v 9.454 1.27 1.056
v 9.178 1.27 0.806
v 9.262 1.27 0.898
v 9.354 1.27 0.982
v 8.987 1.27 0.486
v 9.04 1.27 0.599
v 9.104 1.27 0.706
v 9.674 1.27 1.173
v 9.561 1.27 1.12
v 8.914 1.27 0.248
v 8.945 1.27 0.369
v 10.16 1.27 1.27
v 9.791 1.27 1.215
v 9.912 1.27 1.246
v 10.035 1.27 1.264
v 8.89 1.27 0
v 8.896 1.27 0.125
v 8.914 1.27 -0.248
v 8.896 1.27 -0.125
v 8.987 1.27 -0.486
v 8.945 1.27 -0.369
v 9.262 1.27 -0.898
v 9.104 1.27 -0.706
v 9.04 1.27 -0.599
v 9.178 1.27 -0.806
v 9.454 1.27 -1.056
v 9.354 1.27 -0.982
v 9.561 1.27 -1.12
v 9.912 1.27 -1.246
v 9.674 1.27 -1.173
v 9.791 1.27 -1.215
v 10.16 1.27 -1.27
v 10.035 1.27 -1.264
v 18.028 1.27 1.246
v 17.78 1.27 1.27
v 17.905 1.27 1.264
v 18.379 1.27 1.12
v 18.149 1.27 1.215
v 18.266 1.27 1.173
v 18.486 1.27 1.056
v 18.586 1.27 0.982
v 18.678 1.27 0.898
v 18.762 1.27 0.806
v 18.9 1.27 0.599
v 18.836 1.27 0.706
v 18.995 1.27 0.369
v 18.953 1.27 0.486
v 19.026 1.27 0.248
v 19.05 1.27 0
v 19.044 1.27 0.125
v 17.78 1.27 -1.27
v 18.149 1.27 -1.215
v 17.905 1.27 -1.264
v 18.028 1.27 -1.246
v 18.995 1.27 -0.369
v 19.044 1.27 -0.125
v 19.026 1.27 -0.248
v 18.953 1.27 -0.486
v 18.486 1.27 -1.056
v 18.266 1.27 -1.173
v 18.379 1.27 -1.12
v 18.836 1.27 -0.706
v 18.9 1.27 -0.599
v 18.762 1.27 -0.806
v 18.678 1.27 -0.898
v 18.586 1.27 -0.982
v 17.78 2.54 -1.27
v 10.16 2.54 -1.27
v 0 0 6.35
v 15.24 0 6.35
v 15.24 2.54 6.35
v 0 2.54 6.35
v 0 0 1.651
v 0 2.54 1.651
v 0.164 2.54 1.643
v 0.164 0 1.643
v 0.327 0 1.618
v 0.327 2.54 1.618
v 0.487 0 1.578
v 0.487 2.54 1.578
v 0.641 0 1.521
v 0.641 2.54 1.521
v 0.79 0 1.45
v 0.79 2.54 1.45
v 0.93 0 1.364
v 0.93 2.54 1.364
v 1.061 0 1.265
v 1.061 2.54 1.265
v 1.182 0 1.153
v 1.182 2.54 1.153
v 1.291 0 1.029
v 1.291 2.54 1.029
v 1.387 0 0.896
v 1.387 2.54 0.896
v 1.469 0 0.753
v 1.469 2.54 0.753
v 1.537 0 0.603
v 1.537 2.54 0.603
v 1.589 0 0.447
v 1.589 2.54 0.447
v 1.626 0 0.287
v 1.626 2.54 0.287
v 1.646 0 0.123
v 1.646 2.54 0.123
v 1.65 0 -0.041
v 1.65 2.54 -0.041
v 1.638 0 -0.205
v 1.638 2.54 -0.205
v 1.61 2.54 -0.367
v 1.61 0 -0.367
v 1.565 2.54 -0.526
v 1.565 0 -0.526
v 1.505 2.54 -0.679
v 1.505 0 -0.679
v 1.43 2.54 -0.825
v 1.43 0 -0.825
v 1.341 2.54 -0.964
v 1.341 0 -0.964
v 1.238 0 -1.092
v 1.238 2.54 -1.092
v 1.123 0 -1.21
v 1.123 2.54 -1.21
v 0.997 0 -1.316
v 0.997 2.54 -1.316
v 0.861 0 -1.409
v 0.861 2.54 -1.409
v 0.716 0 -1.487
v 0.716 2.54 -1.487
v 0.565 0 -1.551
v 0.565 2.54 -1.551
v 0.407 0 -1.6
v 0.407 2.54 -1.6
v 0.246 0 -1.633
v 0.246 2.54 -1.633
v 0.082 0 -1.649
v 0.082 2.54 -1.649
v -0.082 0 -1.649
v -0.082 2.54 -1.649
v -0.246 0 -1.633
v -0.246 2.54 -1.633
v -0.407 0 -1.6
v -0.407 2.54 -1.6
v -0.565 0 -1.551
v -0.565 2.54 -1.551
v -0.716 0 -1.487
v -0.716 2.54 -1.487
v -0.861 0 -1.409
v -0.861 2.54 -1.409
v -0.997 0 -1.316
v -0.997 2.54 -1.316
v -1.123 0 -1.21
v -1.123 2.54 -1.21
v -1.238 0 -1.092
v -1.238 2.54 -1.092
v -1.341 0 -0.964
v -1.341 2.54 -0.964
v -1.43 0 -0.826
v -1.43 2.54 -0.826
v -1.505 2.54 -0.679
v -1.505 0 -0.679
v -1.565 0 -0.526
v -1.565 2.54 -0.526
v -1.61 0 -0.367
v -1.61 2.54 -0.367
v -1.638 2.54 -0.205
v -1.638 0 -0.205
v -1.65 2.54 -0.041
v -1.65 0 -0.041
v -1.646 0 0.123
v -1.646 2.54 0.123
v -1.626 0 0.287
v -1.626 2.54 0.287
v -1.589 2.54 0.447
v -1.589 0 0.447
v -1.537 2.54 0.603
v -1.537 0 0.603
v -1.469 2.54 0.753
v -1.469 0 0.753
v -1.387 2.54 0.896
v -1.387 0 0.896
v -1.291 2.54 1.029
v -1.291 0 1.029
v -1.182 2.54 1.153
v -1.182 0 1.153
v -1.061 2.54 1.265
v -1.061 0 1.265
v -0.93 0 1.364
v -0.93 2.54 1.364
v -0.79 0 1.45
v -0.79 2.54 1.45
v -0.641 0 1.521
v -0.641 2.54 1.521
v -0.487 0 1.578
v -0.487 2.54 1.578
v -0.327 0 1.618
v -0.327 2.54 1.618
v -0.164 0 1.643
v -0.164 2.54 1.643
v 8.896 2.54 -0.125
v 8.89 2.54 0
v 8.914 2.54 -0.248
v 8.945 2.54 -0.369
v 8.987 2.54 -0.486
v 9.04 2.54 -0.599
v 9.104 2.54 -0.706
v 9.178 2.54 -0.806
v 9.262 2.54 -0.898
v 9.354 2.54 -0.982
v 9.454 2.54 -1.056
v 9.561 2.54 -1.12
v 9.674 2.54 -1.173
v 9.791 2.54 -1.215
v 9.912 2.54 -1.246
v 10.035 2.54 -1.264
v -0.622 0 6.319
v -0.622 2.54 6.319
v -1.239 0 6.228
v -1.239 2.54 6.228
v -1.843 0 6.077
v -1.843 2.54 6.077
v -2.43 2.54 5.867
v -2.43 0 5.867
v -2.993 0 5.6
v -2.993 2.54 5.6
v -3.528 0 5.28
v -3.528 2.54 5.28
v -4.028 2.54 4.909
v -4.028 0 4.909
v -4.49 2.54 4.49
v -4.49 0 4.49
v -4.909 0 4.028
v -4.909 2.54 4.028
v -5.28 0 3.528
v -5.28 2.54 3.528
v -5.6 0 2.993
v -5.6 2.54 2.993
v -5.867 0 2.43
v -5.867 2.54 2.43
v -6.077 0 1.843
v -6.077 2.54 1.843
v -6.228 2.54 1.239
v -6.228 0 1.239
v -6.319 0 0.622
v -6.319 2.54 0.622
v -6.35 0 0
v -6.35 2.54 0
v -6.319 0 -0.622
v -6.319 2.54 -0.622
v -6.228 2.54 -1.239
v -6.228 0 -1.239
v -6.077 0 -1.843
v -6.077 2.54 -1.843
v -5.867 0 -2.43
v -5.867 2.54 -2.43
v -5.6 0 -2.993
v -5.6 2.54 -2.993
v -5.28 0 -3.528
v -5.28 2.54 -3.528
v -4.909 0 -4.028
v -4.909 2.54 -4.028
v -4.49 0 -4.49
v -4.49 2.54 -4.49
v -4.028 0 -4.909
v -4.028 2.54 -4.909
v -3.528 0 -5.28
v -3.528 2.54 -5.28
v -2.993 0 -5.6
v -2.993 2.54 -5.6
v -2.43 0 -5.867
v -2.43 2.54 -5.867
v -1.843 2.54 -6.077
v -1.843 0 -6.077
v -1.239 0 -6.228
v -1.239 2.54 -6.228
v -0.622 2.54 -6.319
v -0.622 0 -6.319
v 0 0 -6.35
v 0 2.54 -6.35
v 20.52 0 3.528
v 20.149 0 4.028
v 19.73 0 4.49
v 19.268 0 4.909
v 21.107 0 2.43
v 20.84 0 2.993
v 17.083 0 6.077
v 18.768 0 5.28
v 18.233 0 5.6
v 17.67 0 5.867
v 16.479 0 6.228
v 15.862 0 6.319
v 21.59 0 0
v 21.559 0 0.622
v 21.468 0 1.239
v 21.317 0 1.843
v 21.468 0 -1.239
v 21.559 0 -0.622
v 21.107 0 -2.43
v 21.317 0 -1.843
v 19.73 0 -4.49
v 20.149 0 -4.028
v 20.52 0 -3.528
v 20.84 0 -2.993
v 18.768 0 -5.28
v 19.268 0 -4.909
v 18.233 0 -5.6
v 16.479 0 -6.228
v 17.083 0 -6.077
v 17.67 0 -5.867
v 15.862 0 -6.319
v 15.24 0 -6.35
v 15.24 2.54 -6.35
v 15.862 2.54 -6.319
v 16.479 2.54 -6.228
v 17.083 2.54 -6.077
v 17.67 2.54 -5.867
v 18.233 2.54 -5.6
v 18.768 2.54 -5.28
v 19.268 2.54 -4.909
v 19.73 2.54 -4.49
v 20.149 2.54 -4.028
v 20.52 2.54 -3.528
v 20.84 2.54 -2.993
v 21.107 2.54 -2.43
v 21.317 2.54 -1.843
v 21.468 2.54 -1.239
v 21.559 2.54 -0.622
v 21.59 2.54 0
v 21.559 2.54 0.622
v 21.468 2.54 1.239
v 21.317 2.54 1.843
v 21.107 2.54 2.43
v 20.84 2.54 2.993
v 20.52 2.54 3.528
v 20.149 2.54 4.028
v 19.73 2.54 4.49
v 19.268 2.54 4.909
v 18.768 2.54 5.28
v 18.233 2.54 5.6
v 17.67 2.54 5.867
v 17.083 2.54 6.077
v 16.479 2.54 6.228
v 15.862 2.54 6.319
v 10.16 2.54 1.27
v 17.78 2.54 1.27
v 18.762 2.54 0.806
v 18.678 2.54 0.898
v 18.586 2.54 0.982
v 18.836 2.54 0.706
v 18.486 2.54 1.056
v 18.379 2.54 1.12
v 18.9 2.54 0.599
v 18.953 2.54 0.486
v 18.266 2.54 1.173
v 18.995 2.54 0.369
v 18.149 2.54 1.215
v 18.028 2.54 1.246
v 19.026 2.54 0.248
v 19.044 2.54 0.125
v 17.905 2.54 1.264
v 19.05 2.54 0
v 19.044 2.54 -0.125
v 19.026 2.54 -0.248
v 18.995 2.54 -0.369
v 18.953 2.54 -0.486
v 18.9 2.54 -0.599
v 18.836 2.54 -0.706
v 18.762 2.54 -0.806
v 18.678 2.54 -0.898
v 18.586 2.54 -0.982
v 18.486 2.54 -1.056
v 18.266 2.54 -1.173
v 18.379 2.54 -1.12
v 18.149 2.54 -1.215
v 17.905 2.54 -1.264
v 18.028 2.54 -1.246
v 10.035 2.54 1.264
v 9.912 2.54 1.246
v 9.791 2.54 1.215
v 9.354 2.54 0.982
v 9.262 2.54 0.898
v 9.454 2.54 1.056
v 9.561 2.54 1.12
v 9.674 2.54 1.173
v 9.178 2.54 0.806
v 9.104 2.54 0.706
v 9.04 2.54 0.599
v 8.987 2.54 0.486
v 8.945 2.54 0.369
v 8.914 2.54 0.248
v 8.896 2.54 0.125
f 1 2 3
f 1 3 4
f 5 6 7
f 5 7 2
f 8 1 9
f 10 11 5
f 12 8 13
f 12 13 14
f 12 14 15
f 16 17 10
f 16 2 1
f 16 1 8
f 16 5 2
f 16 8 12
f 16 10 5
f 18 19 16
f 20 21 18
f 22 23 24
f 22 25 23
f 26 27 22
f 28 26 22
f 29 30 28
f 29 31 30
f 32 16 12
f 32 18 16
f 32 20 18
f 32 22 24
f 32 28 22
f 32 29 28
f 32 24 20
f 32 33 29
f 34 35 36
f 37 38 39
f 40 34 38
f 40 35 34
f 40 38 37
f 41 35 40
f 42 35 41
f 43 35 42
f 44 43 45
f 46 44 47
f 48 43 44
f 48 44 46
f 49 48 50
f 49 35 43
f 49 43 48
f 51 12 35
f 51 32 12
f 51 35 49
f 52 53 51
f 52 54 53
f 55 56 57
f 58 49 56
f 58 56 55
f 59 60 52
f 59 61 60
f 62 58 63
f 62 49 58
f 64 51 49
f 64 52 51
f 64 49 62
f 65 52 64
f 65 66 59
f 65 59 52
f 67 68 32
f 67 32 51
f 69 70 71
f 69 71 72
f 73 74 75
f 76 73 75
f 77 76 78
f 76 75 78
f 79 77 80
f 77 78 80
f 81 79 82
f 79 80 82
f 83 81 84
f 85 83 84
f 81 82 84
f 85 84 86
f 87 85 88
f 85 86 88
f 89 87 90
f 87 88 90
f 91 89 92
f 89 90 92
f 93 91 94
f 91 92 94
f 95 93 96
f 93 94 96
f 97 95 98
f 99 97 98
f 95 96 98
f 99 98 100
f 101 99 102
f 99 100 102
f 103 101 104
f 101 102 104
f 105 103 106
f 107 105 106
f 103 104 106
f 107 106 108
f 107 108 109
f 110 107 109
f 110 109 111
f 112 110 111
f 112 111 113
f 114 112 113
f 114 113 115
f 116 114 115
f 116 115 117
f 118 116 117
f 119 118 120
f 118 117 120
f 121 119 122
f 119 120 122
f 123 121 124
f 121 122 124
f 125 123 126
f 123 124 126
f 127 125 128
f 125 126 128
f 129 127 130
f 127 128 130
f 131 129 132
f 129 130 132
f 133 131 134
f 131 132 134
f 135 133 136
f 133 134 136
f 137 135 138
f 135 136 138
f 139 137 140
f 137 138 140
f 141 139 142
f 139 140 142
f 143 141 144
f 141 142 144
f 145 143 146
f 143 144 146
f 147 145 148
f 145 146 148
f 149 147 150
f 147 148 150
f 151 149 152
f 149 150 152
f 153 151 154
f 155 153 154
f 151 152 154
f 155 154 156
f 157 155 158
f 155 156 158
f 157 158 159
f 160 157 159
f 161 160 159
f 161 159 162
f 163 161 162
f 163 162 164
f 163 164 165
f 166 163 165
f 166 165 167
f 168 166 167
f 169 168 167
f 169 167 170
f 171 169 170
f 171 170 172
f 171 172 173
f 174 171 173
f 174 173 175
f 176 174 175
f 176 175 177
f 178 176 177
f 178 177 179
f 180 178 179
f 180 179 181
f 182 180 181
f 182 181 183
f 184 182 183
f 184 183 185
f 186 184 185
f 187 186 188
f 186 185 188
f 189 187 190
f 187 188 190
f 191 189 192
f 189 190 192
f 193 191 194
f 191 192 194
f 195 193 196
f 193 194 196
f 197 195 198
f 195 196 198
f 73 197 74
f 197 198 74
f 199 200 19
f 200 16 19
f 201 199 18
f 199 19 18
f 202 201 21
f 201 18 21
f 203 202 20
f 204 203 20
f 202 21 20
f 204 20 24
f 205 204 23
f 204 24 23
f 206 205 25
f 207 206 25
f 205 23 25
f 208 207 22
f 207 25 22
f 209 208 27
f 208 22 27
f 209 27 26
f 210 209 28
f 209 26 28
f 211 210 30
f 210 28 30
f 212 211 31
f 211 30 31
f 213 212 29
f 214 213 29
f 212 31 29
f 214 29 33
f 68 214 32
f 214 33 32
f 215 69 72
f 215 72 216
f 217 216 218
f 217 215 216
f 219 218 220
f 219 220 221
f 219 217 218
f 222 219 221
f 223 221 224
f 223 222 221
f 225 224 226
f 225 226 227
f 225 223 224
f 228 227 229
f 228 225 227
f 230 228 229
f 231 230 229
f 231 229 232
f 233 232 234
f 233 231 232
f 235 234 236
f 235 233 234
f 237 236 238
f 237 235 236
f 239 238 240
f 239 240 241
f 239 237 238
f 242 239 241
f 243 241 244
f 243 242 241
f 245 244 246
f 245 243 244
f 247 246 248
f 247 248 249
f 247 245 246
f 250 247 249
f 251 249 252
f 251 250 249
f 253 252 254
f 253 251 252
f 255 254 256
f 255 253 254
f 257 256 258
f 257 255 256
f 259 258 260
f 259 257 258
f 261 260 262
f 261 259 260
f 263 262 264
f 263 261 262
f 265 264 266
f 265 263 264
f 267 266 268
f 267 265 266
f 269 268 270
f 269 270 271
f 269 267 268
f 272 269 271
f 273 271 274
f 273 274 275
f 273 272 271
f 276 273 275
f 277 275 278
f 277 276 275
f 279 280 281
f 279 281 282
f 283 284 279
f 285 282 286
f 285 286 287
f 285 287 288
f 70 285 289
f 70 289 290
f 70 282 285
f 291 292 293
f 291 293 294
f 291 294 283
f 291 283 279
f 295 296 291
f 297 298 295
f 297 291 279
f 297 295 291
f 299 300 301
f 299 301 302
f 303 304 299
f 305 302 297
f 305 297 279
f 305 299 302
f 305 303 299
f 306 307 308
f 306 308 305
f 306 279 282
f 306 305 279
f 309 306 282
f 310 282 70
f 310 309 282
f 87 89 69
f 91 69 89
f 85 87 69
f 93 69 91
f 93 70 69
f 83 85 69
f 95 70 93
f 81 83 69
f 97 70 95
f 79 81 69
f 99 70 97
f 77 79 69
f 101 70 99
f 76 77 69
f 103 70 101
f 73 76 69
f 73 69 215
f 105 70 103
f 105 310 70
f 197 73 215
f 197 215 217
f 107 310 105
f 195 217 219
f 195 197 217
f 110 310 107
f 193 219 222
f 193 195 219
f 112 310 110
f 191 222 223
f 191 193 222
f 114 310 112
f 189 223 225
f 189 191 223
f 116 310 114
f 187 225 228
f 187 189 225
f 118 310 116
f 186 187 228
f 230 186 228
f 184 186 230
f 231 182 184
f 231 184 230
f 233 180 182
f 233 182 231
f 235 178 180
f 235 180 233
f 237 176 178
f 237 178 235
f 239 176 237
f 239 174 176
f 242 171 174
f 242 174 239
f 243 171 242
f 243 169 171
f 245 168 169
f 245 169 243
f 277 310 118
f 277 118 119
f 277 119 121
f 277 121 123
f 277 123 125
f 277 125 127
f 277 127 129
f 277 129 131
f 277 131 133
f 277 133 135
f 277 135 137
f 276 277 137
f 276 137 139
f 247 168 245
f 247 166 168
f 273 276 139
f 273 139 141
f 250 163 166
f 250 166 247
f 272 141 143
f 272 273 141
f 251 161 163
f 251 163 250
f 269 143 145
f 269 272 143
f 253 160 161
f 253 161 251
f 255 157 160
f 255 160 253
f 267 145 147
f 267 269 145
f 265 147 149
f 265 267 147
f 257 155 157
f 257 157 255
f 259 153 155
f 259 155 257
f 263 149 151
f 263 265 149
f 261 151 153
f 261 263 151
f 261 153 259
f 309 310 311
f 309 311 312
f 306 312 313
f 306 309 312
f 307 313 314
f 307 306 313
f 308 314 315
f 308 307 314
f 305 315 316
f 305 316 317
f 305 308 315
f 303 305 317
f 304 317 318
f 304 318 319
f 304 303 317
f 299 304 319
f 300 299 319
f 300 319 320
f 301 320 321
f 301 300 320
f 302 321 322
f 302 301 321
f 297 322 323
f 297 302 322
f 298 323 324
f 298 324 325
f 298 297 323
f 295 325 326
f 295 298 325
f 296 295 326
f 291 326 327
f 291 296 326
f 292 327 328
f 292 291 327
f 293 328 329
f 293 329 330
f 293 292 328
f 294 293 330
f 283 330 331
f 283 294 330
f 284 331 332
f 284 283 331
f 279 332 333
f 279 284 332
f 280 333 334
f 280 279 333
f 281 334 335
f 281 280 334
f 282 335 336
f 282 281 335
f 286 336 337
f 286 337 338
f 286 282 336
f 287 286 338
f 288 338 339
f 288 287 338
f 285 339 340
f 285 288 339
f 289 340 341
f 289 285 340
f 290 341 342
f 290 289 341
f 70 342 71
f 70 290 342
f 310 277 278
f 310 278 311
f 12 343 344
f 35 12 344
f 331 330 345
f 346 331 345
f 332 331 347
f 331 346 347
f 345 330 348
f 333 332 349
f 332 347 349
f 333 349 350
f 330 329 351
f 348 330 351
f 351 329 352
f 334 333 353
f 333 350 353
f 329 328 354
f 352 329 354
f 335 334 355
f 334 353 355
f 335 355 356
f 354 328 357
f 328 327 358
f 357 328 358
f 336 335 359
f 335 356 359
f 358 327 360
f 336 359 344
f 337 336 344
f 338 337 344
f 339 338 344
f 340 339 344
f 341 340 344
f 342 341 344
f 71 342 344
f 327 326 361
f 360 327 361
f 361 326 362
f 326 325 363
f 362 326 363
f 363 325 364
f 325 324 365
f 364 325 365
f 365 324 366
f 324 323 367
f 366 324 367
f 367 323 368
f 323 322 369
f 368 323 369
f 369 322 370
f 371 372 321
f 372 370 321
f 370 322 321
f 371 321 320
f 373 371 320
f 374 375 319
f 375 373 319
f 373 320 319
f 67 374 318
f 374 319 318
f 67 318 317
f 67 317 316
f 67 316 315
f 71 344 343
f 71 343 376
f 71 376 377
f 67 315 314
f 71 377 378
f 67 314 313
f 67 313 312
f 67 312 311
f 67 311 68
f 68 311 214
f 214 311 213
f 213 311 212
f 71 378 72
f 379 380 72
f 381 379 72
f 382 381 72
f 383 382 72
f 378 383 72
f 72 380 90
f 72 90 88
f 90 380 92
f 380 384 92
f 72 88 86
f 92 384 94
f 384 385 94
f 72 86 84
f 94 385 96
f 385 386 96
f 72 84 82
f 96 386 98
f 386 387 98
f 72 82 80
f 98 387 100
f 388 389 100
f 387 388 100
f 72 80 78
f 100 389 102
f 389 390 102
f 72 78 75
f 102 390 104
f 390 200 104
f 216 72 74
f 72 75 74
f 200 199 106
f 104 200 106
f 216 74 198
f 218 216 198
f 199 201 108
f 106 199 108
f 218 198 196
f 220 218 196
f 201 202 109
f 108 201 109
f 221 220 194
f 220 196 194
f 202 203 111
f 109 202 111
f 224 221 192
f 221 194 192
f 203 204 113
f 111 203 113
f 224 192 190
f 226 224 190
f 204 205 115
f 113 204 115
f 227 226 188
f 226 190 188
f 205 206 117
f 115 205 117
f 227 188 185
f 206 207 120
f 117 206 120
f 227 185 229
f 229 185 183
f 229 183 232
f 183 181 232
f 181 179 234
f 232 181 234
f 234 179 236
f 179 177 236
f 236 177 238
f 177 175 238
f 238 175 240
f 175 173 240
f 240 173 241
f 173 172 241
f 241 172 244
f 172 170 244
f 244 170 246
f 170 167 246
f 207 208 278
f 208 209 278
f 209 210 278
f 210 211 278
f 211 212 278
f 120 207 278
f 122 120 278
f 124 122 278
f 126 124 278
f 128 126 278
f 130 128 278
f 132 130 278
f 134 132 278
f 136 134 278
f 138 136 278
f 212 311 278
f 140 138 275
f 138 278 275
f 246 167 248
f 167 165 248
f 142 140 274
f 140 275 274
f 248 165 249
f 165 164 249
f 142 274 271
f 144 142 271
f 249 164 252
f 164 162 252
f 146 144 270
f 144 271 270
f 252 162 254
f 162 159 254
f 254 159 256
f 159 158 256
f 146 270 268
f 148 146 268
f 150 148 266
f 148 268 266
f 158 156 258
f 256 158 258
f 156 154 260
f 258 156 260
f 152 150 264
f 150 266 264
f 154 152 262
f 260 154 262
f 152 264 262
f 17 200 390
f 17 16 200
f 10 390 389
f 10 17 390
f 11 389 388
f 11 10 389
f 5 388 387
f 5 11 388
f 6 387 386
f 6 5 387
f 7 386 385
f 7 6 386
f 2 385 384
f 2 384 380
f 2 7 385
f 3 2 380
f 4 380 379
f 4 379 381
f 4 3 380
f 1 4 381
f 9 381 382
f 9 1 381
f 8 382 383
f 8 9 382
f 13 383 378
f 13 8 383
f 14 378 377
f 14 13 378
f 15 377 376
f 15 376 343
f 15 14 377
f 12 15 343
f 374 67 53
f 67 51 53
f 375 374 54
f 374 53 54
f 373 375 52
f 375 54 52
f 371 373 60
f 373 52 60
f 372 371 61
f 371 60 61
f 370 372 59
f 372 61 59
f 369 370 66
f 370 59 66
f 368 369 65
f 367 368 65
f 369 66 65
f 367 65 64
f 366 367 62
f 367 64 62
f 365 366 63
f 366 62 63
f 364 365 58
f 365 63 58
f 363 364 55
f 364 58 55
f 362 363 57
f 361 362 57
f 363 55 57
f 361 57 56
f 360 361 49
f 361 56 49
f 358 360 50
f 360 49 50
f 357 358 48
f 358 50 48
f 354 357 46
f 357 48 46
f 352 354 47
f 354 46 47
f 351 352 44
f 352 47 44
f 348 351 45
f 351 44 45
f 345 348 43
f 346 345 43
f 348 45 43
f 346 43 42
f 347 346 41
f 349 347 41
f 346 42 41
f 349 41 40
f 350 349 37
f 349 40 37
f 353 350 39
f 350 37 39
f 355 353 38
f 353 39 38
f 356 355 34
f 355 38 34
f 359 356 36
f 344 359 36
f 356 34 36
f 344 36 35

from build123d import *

# Parameters (mm, degrees)
BOSS_EXTRUDE1_DEPTH = 2.54
SKETCH2_R           = 1.651
CUT_EXTRUDE1_DEPTH  = 2.54
SKETCH3_W           = 10.16
SKETCH3_H           = 2.54
CUT_EXTRUDE2_DEPTH  = 1.27
FILLET1_R           = 1.27


with BuildPart() as part:
    # Sketch1 → Boss-Extrude1 (new body)
    with BuildSketch(Plane(origin=(0, 0, 0), x_dir=(1, 0, 0), z_dir=(0, 1, 0))):
        with BuildLine():
            Line((0, 6.35), (15.24, 6.35))
            ThreePointArc((15.24, 6.35), (21.59, 0), (15.24, -6.35))
            Line((15.24, -6.35), (0, -6.35))
            ThreePointArc((0, -6.35), (-6.35, 0), (0, 6.35))
        make_face()
    extrude(amount=BOSS_EXTRUDE1_DEPTH)

    # Sketch2 → Cut-Extrude1 (cut)
    with BuildSketch(Plane(origin=(0, 2.54, 0), x_dir=(1, 0, 0), z_dir=(0, 1, 0))):
        with Locations(Location((0, 0, 0), (0, 0, 270))):
            Circle(SKETCH2_R)
    extrude(amount=-CUT_EXTRUDE1_DEPTH, mode=Mode.SUBTRACT)

    # Sketch3 → Cut-Extrude2 (cut)
    with BuildSketch(Plane(origin=(0, 2.54, 0), x_dir=(1, 0, 0), z_dir=(0, 1, 0))):
        with Locations((13.97, 0)):
            Rectangle(SKETCH3_W, SKETCH3_H)
    extrude(amount=-CUT_EXTRUDE2_DEPTH, mode=Mode.SUBTRACT)

    # Fillet1
    fillet1_edges = [part.edges().sort_by_distance(p)[0] for p in [
        (19.05, 1.905, 1.27),
        (19.05, 1.905, -1.27),
        (8.89, 1.905, 1.27),
        (8.89, 1.905, -1.27),
    ]]
    fillet(fillet1_edges, radius=FILLET1_R - 0.0001)  # a hair under: the kernel refuses the full size


solid = part.part
